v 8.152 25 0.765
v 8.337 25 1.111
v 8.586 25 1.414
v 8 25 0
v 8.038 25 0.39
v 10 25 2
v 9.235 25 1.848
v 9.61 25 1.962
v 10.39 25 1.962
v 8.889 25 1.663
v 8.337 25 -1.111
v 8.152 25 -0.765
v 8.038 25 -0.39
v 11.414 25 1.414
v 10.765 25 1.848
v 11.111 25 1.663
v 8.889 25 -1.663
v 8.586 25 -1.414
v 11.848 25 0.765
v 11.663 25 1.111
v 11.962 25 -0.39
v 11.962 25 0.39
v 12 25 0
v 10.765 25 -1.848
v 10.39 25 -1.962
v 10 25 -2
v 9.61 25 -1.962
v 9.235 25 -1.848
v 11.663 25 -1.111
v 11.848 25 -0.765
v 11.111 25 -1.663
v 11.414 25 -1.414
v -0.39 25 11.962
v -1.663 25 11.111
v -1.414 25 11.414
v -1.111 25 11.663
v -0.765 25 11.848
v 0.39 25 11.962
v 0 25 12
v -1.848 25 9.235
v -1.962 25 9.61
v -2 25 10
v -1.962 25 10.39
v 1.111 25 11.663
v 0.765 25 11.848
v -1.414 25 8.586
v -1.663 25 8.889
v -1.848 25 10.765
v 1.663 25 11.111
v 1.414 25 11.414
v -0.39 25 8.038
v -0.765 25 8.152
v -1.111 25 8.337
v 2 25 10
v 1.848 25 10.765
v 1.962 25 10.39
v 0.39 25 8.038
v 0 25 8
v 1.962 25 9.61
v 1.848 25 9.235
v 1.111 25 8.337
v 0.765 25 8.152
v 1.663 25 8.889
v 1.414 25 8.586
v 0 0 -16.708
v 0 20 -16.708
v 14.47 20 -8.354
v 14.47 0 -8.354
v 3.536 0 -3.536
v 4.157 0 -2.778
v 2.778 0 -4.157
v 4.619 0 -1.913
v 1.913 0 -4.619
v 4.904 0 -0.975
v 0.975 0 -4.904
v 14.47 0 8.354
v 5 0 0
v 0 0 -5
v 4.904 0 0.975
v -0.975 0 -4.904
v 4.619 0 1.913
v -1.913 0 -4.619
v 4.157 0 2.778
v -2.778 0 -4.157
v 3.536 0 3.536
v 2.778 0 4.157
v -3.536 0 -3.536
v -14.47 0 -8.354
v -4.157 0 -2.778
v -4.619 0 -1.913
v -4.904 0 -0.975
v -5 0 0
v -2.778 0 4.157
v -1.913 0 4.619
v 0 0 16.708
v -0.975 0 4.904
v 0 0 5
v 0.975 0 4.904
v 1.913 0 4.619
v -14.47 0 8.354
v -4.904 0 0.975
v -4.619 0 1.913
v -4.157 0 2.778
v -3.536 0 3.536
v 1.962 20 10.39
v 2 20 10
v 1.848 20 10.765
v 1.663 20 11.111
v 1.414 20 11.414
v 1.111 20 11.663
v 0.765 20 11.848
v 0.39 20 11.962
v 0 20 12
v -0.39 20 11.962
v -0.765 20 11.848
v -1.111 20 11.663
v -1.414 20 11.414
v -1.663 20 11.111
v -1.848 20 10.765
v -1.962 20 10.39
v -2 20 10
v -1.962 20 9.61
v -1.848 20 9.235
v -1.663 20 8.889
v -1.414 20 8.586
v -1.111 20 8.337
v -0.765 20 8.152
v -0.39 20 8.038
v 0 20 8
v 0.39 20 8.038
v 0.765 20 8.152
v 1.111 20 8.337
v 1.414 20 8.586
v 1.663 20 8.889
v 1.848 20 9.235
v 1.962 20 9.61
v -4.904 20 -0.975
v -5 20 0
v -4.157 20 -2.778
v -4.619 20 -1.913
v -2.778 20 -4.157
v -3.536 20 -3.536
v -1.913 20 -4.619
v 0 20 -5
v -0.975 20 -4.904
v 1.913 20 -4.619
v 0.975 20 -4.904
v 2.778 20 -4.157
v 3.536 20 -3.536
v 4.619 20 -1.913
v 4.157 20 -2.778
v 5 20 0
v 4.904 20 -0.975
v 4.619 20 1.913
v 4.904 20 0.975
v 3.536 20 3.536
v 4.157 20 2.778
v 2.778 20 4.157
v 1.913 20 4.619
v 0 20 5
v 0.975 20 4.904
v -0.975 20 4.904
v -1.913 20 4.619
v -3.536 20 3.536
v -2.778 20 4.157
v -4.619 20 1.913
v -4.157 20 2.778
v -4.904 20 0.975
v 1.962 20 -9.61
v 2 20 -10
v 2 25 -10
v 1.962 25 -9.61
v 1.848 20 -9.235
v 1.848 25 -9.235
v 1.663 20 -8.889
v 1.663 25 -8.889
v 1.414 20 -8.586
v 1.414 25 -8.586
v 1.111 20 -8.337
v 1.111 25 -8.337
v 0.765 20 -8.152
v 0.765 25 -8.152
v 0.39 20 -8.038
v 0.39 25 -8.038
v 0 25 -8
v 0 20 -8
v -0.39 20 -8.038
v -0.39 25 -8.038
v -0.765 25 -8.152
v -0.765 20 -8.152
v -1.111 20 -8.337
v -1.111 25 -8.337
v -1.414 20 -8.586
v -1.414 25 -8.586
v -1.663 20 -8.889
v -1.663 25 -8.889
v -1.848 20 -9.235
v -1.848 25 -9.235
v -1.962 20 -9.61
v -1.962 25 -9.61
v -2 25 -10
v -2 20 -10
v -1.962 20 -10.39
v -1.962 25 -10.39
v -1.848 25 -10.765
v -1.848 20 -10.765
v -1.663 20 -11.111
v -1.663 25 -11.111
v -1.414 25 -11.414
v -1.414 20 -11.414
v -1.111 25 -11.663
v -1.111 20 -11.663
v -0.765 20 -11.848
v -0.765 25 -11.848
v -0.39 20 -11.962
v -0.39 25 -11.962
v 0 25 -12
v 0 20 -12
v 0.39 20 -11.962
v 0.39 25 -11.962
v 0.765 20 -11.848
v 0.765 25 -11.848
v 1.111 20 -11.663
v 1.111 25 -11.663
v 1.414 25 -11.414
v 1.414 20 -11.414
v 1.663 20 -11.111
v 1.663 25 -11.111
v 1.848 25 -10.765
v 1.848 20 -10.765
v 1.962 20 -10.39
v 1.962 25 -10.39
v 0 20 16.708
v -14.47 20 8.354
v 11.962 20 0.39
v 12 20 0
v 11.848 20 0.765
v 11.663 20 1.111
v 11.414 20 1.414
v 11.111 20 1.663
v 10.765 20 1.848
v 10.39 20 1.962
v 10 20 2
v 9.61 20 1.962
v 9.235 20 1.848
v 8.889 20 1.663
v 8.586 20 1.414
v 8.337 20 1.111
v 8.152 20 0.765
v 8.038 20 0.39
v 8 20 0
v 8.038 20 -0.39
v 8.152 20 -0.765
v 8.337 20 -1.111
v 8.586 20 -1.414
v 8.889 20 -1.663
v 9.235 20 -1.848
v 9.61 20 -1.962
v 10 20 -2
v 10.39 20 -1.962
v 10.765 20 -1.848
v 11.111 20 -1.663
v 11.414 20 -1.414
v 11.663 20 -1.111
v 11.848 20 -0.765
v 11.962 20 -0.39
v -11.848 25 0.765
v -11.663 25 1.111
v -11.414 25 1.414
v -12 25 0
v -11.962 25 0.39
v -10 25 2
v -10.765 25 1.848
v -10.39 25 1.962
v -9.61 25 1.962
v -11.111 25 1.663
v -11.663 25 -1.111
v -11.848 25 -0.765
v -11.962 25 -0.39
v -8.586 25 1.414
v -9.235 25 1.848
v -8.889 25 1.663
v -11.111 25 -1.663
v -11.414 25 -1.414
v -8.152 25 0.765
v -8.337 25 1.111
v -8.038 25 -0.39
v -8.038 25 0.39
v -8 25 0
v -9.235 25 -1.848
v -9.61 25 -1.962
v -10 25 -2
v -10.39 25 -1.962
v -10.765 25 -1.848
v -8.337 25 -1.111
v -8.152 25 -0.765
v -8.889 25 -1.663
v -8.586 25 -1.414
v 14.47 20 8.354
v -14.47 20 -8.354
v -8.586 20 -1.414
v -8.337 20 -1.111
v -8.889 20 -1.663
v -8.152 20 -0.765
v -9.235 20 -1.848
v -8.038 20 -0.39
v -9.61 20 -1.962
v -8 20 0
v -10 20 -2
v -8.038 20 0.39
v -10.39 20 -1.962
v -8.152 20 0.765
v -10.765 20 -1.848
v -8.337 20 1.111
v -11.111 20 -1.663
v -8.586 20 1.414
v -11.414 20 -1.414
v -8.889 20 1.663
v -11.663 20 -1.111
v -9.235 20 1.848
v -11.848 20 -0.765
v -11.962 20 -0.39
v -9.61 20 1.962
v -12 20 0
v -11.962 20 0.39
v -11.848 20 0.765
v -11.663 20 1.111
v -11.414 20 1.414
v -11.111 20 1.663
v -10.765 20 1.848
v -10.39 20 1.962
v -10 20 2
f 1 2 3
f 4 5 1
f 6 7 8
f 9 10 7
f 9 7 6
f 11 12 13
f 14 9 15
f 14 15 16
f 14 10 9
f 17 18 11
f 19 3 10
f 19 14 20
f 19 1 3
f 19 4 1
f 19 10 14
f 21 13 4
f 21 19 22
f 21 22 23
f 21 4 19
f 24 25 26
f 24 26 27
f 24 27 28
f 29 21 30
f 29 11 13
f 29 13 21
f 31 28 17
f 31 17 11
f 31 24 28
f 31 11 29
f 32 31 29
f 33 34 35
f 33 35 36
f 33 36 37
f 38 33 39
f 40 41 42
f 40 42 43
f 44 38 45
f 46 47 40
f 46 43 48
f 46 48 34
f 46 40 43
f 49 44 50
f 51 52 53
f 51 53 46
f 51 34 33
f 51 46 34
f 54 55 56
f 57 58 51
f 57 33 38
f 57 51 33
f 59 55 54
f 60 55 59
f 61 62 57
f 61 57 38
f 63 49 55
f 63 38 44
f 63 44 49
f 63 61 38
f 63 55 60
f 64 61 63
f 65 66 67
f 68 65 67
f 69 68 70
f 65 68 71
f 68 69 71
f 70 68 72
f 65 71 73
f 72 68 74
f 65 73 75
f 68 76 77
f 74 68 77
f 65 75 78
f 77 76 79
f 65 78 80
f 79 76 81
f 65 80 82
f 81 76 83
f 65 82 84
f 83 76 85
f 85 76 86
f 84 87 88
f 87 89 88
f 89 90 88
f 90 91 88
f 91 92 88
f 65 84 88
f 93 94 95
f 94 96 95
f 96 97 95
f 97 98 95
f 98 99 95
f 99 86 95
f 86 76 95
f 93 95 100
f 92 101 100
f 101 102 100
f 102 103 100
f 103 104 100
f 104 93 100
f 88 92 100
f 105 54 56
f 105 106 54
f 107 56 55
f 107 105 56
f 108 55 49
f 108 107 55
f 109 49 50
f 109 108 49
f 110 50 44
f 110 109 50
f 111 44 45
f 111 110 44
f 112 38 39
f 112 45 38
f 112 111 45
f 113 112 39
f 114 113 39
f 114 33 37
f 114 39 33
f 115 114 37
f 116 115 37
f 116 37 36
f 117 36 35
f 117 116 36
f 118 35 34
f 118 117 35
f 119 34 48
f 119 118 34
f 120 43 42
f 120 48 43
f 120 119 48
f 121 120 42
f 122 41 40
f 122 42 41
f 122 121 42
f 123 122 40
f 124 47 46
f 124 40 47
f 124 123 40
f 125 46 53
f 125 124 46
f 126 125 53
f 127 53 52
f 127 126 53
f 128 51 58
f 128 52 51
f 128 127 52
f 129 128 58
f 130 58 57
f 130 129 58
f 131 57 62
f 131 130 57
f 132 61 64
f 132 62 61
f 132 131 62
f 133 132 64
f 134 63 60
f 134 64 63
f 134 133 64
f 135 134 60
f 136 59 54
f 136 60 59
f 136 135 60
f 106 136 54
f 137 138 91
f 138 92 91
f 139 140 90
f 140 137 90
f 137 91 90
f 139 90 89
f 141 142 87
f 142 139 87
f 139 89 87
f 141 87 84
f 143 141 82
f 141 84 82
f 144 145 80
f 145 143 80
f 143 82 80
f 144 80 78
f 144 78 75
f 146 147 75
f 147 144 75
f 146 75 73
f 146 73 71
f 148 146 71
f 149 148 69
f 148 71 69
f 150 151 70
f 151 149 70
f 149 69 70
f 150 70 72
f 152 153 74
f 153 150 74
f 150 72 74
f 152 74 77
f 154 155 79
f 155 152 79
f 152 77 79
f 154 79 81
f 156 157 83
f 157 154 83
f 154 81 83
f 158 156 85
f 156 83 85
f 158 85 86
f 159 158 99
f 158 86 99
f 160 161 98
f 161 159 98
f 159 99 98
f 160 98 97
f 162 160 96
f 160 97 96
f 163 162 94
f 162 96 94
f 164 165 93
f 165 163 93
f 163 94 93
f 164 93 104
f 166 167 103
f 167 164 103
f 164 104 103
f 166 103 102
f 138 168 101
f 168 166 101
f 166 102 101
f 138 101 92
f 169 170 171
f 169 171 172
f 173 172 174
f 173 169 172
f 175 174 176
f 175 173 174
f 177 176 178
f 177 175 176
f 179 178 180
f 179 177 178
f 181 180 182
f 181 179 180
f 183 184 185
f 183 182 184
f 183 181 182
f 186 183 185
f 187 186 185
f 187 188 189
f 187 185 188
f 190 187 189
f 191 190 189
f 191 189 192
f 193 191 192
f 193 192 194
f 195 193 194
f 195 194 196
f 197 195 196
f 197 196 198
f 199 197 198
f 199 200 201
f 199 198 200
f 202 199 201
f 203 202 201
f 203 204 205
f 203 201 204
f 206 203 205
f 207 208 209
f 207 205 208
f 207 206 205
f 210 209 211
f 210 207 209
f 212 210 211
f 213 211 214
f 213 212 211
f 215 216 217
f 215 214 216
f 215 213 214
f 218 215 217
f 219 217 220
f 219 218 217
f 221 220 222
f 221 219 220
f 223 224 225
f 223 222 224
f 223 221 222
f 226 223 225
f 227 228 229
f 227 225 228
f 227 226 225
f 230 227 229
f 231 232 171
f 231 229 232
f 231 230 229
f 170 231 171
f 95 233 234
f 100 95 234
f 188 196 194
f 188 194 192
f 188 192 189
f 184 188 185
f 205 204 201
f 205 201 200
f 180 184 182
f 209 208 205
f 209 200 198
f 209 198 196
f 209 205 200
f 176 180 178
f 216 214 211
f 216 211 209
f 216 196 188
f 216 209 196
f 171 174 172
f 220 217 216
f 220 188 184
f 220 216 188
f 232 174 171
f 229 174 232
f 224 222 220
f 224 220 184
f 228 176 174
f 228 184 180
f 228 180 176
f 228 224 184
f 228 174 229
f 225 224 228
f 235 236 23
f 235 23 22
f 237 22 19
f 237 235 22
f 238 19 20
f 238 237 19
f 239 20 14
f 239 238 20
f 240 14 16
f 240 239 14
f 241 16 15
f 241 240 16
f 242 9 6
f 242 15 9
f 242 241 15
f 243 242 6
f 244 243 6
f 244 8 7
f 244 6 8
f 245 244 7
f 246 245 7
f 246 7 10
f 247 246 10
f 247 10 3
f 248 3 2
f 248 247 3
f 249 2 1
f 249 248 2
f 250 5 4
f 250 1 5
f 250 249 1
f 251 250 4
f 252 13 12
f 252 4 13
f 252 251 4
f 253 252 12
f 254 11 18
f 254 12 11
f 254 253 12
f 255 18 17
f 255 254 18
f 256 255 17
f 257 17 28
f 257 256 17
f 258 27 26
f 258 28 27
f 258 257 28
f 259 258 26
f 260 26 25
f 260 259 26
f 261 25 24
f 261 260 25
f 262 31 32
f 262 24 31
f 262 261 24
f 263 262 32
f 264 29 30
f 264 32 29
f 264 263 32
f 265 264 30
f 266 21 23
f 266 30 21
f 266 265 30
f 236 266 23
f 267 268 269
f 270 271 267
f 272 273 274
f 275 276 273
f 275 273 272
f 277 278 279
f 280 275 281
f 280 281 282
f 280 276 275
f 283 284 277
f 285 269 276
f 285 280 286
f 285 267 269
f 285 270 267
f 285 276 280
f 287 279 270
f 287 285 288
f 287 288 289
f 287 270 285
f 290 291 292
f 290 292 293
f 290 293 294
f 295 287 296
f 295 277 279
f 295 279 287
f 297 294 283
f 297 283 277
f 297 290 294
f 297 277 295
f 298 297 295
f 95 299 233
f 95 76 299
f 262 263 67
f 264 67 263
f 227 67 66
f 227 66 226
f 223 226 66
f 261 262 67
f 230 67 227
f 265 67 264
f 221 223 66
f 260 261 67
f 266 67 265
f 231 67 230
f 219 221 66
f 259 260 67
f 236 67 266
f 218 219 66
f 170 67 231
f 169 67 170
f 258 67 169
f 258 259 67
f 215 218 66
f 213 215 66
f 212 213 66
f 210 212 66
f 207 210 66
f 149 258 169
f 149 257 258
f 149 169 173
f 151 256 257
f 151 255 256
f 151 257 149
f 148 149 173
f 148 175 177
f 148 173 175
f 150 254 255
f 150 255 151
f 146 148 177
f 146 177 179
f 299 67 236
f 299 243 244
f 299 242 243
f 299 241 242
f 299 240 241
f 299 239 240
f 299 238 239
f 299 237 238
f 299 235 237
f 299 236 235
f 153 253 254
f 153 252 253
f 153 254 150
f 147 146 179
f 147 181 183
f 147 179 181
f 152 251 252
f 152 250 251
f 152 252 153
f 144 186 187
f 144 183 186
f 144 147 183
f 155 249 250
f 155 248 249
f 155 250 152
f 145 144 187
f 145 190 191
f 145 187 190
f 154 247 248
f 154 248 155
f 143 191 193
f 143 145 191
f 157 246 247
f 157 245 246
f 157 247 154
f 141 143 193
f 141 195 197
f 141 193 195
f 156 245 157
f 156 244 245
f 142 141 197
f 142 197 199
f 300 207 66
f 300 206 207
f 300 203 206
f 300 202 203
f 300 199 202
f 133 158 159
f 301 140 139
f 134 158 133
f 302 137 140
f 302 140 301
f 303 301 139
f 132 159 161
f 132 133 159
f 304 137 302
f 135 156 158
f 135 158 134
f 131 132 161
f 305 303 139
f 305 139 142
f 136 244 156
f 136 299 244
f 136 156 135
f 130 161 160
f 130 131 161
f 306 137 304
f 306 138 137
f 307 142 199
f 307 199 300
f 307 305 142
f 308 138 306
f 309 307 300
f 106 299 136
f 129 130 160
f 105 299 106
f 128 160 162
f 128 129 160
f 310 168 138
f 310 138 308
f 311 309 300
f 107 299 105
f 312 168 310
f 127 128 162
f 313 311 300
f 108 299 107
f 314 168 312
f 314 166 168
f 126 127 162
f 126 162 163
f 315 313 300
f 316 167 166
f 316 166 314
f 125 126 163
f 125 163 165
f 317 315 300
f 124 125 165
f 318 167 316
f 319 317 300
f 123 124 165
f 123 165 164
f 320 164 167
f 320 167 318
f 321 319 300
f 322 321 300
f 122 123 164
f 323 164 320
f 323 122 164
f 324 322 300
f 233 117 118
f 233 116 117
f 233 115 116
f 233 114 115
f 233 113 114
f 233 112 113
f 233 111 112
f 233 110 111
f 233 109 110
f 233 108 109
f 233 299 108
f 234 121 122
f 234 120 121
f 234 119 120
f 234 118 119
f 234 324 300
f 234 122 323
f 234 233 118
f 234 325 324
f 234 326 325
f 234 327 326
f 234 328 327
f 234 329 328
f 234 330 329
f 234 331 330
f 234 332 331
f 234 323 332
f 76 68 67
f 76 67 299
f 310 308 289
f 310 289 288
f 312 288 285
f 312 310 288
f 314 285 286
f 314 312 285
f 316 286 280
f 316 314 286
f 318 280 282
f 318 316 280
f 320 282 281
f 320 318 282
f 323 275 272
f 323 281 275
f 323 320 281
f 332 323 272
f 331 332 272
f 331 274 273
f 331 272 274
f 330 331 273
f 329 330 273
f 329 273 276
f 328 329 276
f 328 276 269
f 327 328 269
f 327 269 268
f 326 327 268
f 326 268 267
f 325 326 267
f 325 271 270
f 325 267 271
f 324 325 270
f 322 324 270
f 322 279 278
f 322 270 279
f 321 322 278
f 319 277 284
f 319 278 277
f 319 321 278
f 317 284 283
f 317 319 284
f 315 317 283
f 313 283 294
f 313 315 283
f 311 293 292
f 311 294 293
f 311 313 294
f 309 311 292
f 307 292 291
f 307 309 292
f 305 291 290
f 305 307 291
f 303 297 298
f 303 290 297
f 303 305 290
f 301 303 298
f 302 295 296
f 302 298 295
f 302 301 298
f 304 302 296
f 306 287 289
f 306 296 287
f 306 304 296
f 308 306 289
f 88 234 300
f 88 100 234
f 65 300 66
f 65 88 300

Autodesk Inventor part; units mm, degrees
ref_plane "YZ Plane" through (0, 0, 0) normal (1, 0, 0) x (0, 1, 0)
ref_plane "XZ Plane" through (0, 0, 0) normal (0, 1, 0) x (-1, 0, 0)
ref_plane "XY Plane" through (0, 0, 0) normal (0, 0, 1) x (1, 0, 0)
sketch "Sketch1" plane through (0, 0, 0) normal (0, 1, 0) x (-1, 0, 0)
  line L0 (0, -16.7083) -> (-14.4698, -8.3542)
  line L1 (-14.4698, -8.3542) -> (-14.4698, 8.3542)
  line L2 (-14.4698, 8.3542) -> (0, 16.7083)
  line L3 (0, 16.7083) -> (14.4698, 8.3542)
  line L4 (14.4698, 8.3542) -> (14.4698, -8.3542)
  line L5 (14.4698, -8.3542) -> (0, -16.7083)
  circle A0 centre (0, 0) radius 5
  dimension "d0" = 10
extrude "Extrusion1" add sketch "Sketch1" along normal blind 20
thread "Thread1" size "M10x1.5" class "6H" standard "ANSI Metric M Profile" full length
sketch "Sketch2" plane through (0, 20, 0) normal (0, 1, 0) x (1, 0, 0)
  circle A0 centre (-10, 0) radius 2
  circle A1 centre (0, 10) radius 2
  circle A2 centre (0, -10) radius 2
  circle A3 centre (10, 0) radius 2
  point P0 (0, 0)
  dimension "d6" = 4
  dimension "d7" = 4
  dimension "d8" = 4
  dimension "d9" = 4
extrude "Extrusion2" add sketch "Sketch2" along normal blind 5
properties part number "Nut"
